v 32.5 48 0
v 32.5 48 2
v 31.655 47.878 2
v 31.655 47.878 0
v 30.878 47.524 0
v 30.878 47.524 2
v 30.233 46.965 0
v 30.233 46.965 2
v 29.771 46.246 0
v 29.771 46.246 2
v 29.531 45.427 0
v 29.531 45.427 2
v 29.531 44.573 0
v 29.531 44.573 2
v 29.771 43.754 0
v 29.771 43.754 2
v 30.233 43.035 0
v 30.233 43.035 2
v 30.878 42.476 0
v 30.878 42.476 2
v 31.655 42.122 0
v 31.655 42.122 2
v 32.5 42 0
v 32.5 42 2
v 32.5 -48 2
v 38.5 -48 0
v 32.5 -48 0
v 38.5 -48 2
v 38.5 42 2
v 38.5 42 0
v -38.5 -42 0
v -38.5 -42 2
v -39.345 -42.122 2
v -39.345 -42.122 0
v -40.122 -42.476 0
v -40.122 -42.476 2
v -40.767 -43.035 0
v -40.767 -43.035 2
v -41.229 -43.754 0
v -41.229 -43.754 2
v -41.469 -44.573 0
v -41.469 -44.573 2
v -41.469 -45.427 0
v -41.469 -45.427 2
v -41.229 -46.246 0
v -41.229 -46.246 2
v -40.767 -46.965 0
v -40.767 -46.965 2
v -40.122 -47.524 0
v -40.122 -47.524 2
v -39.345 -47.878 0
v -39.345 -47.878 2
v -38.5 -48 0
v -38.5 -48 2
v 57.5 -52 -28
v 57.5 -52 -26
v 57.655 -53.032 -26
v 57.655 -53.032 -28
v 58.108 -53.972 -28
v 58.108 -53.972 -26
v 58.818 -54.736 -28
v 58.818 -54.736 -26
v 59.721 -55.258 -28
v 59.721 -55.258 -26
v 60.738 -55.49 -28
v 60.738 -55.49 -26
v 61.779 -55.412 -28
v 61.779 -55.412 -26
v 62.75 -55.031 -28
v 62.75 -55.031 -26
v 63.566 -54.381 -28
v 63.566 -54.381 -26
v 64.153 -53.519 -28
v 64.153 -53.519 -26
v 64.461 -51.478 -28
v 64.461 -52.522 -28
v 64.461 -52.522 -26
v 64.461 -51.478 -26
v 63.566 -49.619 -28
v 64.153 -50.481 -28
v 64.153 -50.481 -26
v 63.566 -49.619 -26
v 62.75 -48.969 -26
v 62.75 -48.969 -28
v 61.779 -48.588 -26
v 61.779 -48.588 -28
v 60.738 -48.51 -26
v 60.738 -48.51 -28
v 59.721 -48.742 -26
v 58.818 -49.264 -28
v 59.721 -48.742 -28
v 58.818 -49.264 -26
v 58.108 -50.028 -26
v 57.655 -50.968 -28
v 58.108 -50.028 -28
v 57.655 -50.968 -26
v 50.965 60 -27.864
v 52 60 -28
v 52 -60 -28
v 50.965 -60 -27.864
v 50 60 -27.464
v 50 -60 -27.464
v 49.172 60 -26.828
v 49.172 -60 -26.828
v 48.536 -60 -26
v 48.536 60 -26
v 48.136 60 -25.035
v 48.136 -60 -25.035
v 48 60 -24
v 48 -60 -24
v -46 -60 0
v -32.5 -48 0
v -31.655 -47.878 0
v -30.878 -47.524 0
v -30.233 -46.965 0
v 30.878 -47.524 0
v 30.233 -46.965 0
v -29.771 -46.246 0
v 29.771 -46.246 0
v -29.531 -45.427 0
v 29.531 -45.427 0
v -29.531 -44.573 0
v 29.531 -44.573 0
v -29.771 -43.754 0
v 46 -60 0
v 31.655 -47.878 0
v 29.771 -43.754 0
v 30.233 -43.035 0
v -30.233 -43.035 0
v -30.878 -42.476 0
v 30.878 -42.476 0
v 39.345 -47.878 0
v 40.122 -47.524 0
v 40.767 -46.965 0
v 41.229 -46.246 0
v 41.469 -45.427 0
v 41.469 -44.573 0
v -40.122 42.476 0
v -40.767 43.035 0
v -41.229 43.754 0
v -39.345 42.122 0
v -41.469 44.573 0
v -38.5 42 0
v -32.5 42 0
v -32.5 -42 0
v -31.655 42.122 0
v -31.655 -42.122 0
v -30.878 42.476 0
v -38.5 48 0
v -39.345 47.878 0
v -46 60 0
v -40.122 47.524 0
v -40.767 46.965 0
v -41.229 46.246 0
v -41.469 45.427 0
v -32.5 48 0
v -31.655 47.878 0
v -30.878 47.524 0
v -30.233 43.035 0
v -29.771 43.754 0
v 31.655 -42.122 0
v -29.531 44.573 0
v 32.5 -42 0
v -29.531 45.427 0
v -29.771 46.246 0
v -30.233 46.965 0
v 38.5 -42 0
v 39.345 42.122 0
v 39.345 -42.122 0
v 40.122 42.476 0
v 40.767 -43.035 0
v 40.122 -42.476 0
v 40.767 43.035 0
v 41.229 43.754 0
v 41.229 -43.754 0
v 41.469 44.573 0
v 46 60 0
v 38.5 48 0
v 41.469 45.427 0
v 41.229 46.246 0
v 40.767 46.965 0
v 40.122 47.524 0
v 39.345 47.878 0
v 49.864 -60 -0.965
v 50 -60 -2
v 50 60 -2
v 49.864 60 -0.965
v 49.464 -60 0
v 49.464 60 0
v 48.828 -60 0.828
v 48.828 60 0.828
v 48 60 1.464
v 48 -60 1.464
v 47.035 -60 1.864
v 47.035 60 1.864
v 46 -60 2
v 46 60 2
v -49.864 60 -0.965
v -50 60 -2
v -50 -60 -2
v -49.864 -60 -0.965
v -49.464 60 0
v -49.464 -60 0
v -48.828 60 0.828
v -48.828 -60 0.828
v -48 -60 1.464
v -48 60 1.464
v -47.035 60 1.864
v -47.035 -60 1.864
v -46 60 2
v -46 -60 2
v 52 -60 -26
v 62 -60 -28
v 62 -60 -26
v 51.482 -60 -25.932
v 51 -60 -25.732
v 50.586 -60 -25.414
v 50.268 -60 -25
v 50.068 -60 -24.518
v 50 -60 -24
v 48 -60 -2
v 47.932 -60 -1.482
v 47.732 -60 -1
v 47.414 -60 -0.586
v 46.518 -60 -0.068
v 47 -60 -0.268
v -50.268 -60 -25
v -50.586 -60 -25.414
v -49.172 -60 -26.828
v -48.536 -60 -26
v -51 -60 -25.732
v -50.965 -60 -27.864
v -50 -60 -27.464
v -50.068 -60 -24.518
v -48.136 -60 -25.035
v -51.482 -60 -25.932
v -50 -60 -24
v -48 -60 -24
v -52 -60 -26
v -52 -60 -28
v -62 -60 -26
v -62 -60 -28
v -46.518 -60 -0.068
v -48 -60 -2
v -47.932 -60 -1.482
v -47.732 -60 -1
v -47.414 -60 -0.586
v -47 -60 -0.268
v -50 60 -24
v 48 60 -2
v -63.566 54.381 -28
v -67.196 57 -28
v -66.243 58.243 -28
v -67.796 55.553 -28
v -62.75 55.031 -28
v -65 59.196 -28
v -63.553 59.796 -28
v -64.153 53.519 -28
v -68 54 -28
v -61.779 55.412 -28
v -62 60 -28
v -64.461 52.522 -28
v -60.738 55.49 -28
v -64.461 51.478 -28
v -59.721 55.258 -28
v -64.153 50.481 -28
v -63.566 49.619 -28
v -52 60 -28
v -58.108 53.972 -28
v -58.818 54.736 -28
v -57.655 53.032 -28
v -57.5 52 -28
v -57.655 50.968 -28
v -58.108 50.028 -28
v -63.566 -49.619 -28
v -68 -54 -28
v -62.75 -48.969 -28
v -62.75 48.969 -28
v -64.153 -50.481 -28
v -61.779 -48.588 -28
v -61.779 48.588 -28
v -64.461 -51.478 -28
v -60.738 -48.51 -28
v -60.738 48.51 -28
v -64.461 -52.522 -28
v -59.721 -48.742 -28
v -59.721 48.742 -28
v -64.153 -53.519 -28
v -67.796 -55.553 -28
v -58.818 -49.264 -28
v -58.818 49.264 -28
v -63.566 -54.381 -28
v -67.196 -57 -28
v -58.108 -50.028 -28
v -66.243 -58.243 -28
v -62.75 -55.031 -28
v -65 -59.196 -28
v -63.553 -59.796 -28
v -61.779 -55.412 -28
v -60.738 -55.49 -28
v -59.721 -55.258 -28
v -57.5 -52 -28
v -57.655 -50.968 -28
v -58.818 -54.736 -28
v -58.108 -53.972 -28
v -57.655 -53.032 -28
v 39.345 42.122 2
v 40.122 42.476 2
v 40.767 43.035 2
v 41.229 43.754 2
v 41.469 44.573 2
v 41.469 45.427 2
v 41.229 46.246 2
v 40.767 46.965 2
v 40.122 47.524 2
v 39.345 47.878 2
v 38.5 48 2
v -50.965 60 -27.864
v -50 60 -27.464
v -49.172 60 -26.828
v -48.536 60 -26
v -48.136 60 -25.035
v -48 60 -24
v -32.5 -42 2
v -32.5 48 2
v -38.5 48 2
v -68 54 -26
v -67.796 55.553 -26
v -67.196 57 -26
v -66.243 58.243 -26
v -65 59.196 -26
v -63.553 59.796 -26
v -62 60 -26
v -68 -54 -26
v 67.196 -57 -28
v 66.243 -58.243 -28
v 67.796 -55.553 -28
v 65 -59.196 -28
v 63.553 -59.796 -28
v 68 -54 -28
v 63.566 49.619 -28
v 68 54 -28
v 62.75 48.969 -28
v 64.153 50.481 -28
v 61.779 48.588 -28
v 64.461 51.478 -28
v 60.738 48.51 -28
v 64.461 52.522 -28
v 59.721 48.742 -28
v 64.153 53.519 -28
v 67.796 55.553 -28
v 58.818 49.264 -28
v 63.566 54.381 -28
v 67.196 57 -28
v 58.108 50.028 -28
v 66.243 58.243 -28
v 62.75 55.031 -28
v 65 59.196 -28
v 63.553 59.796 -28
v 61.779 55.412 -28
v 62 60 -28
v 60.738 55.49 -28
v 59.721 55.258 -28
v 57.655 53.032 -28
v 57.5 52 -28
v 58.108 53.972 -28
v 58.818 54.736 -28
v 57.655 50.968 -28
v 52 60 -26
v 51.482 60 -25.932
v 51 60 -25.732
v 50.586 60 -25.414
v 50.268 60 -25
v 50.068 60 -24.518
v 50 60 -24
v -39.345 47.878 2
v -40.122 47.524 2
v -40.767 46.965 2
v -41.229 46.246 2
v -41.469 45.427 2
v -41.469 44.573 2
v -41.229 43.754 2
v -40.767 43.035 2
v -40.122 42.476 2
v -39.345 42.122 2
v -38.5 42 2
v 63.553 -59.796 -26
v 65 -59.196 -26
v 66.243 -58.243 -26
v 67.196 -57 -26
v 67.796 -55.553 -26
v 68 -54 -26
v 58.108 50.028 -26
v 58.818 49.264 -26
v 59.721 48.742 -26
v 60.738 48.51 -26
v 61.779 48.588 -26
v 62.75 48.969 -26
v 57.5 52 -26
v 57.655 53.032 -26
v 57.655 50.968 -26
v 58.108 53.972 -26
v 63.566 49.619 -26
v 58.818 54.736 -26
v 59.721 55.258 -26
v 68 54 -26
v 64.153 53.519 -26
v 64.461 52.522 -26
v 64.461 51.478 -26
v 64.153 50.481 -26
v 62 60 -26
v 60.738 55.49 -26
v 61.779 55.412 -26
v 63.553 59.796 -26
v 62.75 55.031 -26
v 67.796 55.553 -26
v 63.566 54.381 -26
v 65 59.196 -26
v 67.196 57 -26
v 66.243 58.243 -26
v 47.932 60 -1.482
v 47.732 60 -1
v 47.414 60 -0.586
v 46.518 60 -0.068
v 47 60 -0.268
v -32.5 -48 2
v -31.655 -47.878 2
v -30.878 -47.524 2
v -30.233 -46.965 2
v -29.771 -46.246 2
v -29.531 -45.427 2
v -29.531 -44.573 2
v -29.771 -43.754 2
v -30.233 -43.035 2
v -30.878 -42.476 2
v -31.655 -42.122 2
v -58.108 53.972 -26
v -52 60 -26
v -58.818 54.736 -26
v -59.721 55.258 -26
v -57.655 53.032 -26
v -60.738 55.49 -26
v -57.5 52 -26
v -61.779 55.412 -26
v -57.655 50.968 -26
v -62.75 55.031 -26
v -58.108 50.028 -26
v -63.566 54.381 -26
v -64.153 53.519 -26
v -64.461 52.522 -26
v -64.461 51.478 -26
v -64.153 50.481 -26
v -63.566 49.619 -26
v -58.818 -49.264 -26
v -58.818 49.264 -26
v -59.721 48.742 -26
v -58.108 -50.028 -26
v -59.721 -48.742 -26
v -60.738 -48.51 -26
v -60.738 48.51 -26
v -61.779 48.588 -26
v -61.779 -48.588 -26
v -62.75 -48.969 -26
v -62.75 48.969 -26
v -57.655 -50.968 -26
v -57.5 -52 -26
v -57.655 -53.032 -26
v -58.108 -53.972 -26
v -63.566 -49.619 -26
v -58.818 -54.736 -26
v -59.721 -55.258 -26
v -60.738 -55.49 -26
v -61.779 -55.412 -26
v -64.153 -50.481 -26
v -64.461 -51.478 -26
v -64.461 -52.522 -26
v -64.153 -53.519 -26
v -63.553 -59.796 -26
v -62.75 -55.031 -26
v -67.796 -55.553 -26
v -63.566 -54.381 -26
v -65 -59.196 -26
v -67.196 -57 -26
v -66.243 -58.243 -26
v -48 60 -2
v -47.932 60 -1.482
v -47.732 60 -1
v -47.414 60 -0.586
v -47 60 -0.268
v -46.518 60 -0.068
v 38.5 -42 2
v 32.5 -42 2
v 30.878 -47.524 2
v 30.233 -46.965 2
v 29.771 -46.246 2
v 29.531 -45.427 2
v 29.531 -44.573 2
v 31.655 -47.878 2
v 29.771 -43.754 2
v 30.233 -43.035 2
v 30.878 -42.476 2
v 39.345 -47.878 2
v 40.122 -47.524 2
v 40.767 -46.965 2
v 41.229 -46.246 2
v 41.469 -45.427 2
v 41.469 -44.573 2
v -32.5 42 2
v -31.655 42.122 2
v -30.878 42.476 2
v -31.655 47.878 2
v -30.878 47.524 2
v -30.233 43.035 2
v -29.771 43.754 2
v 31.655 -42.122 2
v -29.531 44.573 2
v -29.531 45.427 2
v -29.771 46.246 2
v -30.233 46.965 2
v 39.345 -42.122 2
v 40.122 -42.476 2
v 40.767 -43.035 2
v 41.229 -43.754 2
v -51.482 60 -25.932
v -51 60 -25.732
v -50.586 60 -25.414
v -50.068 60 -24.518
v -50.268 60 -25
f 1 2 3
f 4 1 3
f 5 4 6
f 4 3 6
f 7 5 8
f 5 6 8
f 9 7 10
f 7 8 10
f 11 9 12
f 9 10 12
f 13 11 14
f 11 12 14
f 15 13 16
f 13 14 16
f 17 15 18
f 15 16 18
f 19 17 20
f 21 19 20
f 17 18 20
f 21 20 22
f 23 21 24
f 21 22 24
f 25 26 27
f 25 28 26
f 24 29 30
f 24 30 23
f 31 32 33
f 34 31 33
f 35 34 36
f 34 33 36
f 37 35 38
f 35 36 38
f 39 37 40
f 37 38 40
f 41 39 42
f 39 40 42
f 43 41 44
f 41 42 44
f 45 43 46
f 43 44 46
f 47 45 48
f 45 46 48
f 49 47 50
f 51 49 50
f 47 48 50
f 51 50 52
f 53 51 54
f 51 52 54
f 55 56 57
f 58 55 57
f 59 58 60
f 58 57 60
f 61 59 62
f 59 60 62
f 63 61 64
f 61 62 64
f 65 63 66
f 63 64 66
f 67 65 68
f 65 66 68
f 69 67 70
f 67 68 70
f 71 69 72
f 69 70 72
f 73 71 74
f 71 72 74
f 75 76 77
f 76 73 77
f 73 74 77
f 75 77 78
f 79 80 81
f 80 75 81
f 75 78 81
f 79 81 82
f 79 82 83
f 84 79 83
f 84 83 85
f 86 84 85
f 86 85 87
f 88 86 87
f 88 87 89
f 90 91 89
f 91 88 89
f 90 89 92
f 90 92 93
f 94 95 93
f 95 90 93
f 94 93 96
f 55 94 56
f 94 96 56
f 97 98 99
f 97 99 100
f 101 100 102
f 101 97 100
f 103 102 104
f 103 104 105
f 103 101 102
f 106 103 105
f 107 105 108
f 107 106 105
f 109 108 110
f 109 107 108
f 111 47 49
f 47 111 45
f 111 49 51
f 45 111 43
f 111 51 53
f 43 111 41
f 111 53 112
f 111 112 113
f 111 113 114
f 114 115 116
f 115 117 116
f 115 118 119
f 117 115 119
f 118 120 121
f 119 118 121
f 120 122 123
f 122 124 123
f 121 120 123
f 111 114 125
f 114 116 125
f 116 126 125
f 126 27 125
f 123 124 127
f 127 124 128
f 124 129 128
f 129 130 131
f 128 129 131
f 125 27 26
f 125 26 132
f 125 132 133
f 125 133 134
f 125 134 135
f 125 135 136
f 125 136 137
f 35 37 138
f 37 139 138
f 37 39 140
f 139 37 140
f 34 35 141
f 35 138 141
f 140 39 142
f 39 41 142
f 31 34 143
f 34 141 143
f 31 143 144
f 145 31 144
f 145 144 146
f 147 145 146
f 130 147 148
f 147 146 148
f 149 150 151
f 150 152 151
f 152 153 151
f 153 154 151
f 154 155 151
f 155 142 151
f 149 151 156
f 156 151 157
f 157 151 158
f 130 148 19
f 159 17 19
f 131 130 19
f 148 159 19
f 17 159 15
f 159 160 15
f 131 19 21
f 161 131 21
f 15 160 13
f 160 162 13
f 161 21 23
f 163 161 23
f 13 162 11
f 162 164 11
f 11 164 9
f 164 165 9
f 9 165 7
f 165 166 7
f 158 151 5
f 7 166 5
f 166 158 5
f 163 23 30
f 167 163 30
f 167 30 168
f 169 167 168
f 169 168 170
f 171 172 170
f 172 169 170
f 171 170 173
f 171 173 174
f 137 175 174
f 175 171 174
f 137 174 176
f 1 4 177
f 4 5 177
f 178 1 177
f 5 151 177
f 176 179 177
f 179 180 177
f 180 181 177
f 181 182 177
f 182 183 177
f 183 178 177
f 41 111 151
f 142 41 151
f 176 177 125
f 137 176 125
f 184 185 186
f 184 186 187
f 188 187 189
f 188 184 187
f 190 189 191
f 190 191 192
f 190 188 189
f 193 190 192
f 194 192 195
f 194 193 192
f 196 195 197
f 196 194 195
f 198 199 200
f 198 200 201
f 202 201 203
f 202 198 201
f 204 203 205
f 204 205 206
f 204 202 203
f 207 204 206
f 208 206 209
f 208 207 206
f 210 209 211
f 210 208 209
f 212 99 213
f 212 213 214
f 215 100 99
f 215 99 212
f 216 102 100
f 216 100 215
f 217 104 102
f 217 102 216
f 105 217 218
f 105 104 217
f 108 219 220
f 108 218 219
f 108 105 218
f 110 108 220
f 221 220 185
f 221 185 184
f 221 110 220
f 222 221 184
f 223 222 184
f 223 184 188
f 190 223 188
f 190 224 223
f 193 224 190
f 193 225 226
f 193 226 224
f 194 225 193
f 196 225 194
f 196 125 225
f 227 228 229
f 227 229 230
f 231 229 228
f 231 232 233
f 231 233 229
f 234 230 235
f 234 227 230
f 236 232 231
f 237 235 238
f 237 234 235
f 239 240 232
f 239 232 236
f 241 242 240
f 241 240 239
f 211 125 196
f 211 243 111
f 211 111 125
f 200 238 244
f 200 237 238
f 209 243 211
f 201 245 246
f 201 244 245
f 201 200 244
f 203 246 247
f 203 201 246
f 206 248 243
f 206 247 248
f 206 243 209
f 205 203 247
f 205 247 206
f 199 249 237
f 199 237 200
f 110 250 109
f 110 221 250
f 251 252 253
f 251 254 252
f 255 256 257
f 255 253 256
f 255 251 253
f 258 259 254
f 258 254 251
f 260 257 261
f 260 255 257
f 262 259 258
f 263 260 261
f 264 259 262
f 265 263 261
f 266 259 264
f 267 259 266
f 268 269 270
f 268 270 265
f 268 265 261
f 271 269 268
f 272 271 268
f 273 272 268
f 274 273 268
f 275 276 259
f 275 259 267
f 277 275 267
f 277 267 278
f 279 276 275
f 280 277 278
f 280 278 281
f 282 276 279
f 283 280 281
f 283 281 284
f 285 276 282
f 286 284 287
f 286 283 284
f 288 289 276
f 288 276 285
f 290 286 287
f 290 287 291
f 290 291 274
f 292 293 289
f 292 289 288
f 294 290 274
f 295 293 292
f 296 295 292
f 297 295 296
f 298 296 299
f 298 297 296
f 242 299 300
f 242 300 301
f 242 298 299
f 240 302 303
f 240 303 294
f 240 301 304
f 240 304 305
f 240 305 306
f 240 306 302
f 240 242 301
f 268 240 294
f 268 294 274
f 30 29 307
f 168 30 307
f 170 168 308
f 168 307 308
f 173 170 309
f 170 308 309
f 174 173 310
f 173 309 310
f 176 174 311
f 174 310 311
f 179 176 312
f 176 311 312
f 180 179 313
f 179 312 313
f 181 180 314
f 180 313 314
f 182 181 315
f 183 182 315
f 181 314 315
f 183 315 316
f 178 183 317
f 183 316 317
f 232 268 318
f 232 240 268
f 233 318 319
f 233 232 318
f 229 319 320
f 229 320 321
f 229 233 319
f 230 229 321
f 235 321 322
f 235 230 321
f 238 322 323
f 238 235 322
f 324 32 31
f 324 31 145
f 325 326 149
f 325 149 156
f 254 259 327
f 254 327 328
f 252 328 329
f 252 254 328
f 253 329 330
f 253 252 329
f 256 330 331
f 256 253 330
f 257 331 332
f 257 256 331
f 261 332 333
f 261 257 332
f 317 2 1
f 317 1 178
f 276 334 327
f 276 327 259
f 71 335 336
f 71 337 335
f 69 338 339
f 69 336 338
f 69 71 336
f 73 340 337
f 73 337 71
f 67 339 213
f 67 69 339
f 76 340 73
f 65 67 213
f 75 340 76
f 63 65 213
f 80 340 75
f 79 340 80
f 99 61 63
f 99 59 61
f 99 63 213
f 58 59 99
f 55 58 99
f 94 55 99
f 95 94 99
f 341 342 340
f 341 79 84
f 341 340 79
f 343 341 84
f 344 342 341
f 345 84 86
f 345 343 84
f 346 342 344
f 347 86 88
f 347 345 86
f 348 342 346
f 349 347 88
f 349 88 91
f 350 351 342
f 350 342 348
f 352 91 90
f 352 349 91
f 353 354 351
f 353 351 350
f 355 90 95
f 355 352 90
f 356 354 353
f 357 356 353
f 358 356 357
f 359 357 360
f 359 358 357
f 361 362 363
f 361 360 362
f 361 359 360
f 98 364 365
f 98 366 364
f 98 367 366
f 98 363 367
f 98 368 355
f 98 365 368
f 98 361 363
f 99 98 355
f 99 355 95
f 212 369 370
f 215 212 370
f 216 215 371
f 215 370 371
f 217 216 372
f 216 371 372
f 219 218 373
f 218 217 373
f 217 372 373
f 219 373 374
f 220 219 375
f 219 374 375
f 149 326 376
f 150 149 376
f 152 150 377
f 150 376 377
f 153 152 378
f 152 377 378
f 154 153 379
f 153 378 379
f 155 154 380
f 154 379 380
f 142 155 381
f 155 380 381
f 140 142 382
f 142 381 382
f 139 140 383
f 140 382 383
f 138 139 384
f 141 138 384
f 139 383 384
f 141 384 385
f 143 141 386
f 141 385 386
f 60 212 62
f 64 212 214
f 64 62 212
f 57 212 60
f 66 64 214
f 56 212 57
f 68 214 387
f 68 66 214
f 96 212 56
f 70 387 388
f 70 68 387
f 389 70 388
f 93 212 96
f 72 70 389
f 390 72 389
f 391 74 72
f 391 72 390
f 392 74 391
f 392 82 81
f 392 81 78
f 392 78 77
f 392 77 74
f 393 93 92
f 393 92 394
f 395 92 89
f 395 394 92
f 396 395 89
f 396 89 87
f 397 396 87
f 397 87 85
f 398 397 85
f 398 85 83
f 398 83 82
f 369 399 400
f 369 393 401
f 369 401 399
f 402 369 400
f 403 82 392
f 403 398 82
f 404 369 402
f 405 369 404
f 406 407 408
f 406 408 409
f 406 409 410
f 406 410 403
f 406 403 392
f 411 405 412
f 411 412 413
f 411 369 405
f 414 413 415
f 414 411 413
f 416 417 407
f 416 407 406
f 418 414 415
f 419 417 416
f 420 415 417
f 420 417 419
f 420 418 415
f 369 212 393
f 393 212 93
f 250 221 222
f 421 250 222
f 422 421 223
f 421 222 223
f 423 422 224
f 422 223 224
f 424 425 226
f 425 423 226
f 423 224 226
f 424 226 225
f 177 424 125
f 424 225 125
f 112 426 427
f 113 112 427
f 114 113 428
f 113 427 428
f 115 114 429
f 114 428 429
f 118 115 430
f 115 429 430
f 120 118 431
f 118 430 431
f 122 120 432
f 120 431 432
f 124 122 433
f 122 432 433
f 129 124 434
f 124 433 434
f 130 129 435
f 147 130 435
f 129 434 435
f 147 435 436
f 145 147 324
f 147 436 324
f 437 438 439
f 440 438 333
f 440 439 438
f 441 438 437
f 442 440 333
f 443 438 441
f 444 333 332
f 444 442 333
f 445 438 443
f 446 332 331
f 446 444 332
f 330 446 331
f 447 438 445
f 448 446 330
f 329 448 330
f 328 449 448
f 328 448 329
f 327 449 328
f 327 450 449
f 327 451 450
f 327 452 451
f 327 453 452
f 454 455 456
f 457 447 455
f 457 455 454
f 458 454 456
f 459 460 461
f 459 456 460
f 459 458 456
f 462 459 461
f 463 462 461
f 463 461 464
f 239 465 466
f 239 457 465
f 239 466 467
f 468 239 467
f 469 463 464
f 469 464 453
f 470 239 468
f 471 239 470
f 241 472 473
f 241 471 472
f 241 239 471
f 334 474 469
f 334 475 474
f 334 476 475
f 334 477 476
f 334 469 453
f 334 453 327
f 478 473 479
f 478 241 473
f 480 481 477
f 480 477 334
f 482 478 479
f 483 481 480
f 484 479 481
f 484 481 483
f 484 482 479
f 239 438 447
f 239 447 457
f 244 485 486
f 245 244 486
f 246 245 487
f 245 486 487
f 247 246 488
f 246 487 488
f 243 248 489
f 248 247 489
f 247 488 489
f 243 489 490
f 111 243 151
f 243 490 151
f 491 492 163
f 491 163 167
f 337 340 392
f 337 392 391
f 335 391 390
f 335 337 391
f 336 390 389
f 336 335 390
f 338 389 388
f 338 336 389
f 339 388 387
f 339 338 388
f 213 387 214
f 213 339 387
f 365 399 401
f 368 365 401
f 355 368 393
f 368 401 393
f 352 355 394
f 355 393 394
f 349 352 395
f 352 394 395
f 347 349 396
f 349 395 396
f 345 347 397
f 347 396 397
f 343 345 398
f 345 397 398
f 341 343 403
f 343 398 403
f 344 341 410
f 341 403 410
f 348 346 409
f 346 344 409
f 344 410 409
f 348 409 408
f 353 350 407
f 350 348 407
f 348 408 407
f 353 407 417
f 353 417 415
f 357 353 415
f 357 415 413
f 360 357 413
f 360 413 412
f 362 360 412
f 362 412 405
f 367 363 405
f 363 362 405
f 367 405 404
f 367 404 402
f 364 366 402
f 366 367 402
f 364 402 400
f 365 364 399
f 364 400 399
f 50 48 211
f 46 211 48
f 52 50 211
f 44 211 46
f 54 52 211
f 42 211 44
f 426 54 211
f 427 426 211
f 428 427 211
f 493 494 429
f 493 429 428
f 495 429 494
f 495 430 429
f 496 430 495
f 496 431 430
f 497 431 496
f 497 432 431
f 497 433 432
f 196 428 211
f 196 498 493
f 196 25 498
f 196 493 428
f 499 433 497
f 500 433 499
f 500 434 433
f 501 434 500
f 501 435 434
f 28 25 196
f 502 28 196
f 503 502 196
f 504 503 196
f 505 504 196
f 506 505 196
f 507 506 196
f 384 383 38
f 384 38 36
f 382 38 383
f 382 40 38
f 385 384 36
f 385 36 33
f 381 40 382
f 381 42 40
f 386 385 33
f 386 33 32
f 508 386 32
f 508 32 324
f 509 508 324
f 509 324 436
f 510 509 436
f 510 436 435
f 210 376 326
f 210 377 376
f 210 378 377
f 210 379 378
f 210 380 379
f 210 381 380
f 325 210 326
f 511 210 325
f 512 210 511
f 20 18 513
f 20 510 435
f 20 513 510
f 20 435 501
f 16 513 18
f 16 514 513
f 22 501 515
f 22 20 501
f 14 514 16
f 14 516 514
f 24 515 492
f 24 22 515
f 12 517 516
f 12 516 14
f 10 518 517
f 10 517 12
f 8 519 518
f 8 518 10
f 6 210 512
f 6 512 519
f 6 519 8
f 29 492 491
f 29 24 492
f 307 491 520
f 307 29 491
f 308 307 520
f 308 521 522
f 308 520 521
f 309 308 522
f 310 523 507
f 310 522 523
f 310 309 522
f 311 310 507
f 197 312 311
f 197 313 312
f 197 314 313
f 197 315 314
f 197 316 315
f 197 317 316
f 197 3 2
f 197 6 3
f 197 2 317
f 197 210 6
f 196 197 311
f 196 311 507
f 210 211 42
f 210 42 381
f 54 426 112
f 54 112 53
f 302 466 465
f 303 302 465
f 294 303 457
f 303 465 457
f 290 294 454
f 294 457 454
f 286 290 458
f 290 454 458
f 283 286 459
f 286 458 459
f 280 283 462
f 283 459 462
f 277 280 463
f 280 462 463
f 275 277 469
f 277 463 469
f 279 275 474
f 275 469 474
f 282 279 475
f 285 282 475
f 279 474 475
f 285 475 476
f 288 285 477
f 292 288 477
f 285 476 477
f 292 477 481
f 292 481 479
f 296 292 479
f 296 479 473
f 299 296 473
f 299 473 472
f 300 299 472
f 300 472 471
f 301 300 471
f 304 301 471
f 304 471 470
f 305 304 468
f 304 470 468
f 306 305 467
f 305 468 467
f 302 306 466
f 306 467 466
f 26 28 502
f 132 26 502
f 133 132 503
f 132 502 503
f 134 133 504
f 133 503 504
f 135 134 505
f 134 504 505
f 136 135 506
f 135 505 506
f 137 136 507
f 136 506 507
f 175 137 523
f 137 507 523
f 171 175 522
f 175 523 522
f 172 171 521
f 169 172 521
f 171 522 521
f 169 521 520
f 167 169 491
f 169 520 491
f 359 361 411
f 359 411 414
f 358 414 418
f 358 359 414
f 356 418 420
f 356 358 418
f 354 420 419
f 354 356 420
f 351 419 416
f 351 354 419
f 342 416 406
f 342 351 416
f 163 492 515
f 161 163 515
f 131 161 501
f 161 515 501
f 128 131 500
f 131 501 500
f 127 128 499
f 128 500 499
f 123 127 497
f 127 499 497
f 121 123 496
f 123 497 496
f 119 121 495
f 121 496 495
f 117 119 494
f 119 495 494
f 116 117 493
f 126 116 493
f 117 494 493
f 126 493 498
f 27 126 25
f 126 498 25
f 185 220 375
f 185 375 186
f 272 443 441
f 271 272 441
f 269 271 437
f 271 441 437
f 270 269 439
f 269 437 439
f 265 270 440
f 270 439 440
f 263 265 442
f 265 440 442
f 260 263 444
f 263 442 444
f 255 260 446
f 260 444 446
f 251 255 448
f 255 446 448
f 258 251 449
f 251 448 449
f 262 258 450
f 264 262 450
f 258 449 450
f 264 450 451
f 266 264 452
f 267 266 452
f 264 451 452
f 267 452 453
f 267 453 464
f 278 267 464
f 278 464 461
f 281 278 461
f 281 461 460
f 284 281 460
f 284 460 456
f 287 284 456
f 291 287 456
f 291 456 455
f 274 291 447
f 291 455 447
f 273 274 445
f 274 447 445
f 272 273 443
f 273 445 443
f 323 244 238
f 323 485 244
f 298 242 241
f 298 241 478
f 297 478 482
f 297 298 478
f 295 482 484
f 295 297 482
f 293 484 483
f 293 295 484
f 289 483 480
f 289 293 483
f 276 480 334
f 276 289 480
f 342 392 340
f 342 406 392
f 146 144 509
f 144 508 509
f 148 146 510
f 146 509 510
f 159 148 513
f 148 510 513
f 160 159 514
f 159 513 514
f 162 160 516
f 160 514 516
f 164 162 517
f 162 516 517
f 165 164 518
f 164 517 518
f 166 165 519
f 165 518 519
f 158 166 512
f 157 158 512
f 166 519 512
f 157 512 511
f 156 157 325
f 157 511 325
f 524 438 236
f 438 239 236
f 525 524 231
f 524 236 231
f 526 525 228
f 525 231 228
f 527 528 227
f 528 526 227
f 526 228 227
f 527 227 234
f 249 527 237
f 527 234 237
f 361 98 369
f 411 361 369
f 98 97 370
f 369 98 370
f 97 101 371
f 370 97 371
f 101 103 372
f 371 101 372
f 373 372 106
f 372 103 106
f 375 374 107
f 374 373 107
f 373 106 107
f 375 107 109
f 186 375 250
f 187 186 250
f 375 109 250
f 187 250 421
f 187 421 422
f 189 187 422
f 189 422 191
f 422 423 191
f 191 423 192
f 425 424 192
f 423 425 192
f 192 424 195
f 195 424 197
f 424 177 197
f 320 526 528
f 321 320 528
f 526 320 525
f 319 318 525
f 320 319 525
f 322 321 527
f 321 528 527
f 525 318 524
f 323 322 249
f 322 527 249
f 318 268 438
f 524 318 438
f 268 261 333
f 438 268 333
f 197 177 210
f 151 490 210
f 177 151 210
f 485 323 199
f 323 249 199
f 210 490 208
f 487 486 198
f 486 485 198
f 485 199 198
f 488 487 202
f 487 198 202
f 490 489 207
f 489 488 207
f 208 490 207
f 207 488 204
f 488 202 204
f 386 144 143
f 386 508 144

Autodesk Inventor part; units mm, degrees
ref_plane "YZ Plane" through (0, 0, 0) normal (1, 0, 0) x (0, 1, 0)
ref_plane "XZ Plane" through (0, 0, 0) normal (0, 1, 0) x (-1, 0, 0)
ref_plane "XY Plane" through (0, 0, 0) normal (0, 0, 1) x (1, 0, 0)
sketch "Sketch1" plane through (0, 0, 0) normal (0, 0, 1) x (1, 0, 0)
  line L0 (-50, -60) -> (50, -60)
  line L1 (50, -60) -> (50, 60)
  line L2 (50, 60) -> (-50, 60)
  line L3 (-50, 60) -> (-50, -60)
  line L4 (-50, -60) -> (50, 60) construction
  line L5 (50, -60) -> (-50, 60) construction
  point P0 (0, 0)
  dimension "d0" = 100
  dimension "d1" = 120
extrude "Plate1" add sketch "Sketch1" along normal blind 2
sketch "Sketch5" plane through (48, -60, 2) normal (1, 0, 0) x (0, 1, 0)
  line L0 (120, 0) -> (0, 0)
  line L1 (0, 0) -> (0, -30)
  line L2 (0, -30) -> (120, -30)
  line L3 (120, -30) -> (120, 0)
edge flange "Flange2" height 30 angle 90 thickness 2 bend radius 2 thickness toward (1, 0, 0) relief tear relief width 2 relief depth 1 corner gap 2 corner form 0 edges at (50, 0, 0) (-50, 0, 0) wall of the first edge with corners at (48, 60, 2) (48, -60, 2) (48, -60, -28) (48, 60, -28)
bend "Bend2"
corner "Corner2"
sketch "Sketch6" plane through (-48, -60, -26) normal (0, 0, -1) x (-1, 0, 0)
  line L0 (0, 120) -> (0, 0)
  line L1 (0, 0) -> (20, 0)
  line L2 (20, 0) -> (20, 120)
  line L3 (20, 120) -> (0, 120)
edge flange "Flange3" height 20 angle 90 thickness 2 bend radius 2 thickness toward (0, 0, -1) relief tear relief width 2 relief depth 1 corner gap 2 corner form 0 edges at (-50, 0, -28) (50, 0, -28) wall of the first edge with corners at (-48, 60, -26) (-48, -60, -26) (-68, -60, -26) (-68, 60, -26)
bend "Bend3"
corner "Corner3"
sketch "Sketch7" plane through (0, 0, 2) normal (0, 0, 1) x (1, 0, 0)
  line L0 (-38.5, 45) -> (-32.5, 45) construction
  line L1 (-38.5, 48) -> (-32.5, 48)
  line L2 (-32.5, 42) -> (-38.5, 42)
  arc A0 (-38.5, 48) -> (-38.5, 42) centre (-38.5, 45) ccw
  arc A1 (-32.5, 42) -> (-32.5, 48) centre (-32.5, 45) ccw
  line L3 (0, 0) -> (0, 36.7508)
  line L4 (0, 0) -> (-25.7119, 0)
  line L5 (32.5, 45) -> (38.5, 45) construction
  line L6 (32.5, 48) -> (38.5, 48)
  line L7 (38.5, 42) -> (32.5, 42)
  arc A2 (32.5, 48) -> (32.5, 42) centre (32.5, 45) ccw
  arc A3 (38.5, 42) -> (38.5, 48) centre (38.5, 45) ccw
  line L8 (-38.5, -45) -> (-32.5, -45) construction
  line L9 (-38.5, -42) -> (-32.5, -42)
  line L10 (-32.5, -48) -> (-38.5, -48)
  arc A4 (-38.5, -42) -> (-38.5, -48) centre (-38.5, -45) ccw
  arc A5 (-32.5, -48) -> (-32.5, -42) centre (-32.5, -45) ccw
  line L11 (32.5, -45) -> (38.5, -45) construction
  line L12 (32.5, -42) -> (38.5, -42)
  line L13 (38.5, -48) -> (32.5, -48)
  arc A6 (32.5, -42) -> (32.5, -48) centre (32.5, -45) ccw
  arc A7 (38.5, -48) -> (38.5, -42) centre (38.5, -45) ccw
  point P0 (-35.5, 45)
  point P1 (35.5, 45)
  point P2 (-35.5, -45)
  point P3 (35.5, -45)
  dimension "d42" = 6
  dimension "d43" = 6
  dimension "d50" = 71
  dimension "d51" = 90
extrude "Cut1" cut sketch "Sketch7" against normal blind 2
sketch "Sketch8" plane through (-68, -60, -26) normal (0, 0, 1) x (1, 0, 0)
  circle A0 centre (7, 112) radius 3.5
  circle A1 centre (7, 8) radius 3.5
  line L0 (16, 120) -> (0, 120) projected
  line L1 (0, 120) -> (0, 0) projected
  line L2 (0, 60) -> (53.6667, 60)
  point P0 (68, 60)
  dimension "d54" = 7
  dimension "d55" = 8
  dimension "d56" = 7
extrude "Cut2" cut sketch "Sketch8" against normal blind 2
mirror "Mirror1" about plane through (0, 0, 0) normal (1, 0, 0) of "Cut2"
fillet "Corner Round1" radius 6 4 edges at (-68, -60, -27) (-68, 60, -27) (68, 60, -27) (68, -60, -27)
equation "\"d52\" = Thickness"
equation "\"d57\" = Thickness"
equation "\"d2\" = Thickness"
equation "\"d22\" = BendReliefWidth"
equation "\"d23\" = BendReliefDepth"
equation "\"d24\" = MinimumRemnant"
equation "\"d25\" = TransitionRadius"
equation "\"d28\" = BendRadius"
equation "\"d29\" = CornerReliefSize"
equation "\"d30\" = GapSize"
equation "\"d31\" = JacobiRadiusSize"
equation "\"d32\" = BendReliefWidth"
equation "\"d33\" = BendReliefDepth"
equation "\"d34\" = MinimumRemnant"
equation "\"d35\" = TransitionRadius"
equation "\"d38\" = BendRadius"
equation "\"d39\" = CornerReliefSize"
equation "\"d40\" = GapSize"
equation "\"d41\" = JacobiRadiusSize"
equation "\"BendRadius\" = Thickness"
equation "\"BendReliefWidth\" = Thickness"
equation "\"BendReliefDepth\" = 0.5 * Thickness"
equation "\"CornerReliefSize\" = 4 * Thickness"
equation "\"MinimumRemnant\" = 2 * Thickness"
equation "\"TransitionRadius\" = BendRadius"
equation "\"JacobiRadiusSize\" = BendRadius"
equation "\"GapSize\" = Thickness"
equation "\"Thickness\" = 2"
properties part number "PNS- motor 030 reductor pillar"
